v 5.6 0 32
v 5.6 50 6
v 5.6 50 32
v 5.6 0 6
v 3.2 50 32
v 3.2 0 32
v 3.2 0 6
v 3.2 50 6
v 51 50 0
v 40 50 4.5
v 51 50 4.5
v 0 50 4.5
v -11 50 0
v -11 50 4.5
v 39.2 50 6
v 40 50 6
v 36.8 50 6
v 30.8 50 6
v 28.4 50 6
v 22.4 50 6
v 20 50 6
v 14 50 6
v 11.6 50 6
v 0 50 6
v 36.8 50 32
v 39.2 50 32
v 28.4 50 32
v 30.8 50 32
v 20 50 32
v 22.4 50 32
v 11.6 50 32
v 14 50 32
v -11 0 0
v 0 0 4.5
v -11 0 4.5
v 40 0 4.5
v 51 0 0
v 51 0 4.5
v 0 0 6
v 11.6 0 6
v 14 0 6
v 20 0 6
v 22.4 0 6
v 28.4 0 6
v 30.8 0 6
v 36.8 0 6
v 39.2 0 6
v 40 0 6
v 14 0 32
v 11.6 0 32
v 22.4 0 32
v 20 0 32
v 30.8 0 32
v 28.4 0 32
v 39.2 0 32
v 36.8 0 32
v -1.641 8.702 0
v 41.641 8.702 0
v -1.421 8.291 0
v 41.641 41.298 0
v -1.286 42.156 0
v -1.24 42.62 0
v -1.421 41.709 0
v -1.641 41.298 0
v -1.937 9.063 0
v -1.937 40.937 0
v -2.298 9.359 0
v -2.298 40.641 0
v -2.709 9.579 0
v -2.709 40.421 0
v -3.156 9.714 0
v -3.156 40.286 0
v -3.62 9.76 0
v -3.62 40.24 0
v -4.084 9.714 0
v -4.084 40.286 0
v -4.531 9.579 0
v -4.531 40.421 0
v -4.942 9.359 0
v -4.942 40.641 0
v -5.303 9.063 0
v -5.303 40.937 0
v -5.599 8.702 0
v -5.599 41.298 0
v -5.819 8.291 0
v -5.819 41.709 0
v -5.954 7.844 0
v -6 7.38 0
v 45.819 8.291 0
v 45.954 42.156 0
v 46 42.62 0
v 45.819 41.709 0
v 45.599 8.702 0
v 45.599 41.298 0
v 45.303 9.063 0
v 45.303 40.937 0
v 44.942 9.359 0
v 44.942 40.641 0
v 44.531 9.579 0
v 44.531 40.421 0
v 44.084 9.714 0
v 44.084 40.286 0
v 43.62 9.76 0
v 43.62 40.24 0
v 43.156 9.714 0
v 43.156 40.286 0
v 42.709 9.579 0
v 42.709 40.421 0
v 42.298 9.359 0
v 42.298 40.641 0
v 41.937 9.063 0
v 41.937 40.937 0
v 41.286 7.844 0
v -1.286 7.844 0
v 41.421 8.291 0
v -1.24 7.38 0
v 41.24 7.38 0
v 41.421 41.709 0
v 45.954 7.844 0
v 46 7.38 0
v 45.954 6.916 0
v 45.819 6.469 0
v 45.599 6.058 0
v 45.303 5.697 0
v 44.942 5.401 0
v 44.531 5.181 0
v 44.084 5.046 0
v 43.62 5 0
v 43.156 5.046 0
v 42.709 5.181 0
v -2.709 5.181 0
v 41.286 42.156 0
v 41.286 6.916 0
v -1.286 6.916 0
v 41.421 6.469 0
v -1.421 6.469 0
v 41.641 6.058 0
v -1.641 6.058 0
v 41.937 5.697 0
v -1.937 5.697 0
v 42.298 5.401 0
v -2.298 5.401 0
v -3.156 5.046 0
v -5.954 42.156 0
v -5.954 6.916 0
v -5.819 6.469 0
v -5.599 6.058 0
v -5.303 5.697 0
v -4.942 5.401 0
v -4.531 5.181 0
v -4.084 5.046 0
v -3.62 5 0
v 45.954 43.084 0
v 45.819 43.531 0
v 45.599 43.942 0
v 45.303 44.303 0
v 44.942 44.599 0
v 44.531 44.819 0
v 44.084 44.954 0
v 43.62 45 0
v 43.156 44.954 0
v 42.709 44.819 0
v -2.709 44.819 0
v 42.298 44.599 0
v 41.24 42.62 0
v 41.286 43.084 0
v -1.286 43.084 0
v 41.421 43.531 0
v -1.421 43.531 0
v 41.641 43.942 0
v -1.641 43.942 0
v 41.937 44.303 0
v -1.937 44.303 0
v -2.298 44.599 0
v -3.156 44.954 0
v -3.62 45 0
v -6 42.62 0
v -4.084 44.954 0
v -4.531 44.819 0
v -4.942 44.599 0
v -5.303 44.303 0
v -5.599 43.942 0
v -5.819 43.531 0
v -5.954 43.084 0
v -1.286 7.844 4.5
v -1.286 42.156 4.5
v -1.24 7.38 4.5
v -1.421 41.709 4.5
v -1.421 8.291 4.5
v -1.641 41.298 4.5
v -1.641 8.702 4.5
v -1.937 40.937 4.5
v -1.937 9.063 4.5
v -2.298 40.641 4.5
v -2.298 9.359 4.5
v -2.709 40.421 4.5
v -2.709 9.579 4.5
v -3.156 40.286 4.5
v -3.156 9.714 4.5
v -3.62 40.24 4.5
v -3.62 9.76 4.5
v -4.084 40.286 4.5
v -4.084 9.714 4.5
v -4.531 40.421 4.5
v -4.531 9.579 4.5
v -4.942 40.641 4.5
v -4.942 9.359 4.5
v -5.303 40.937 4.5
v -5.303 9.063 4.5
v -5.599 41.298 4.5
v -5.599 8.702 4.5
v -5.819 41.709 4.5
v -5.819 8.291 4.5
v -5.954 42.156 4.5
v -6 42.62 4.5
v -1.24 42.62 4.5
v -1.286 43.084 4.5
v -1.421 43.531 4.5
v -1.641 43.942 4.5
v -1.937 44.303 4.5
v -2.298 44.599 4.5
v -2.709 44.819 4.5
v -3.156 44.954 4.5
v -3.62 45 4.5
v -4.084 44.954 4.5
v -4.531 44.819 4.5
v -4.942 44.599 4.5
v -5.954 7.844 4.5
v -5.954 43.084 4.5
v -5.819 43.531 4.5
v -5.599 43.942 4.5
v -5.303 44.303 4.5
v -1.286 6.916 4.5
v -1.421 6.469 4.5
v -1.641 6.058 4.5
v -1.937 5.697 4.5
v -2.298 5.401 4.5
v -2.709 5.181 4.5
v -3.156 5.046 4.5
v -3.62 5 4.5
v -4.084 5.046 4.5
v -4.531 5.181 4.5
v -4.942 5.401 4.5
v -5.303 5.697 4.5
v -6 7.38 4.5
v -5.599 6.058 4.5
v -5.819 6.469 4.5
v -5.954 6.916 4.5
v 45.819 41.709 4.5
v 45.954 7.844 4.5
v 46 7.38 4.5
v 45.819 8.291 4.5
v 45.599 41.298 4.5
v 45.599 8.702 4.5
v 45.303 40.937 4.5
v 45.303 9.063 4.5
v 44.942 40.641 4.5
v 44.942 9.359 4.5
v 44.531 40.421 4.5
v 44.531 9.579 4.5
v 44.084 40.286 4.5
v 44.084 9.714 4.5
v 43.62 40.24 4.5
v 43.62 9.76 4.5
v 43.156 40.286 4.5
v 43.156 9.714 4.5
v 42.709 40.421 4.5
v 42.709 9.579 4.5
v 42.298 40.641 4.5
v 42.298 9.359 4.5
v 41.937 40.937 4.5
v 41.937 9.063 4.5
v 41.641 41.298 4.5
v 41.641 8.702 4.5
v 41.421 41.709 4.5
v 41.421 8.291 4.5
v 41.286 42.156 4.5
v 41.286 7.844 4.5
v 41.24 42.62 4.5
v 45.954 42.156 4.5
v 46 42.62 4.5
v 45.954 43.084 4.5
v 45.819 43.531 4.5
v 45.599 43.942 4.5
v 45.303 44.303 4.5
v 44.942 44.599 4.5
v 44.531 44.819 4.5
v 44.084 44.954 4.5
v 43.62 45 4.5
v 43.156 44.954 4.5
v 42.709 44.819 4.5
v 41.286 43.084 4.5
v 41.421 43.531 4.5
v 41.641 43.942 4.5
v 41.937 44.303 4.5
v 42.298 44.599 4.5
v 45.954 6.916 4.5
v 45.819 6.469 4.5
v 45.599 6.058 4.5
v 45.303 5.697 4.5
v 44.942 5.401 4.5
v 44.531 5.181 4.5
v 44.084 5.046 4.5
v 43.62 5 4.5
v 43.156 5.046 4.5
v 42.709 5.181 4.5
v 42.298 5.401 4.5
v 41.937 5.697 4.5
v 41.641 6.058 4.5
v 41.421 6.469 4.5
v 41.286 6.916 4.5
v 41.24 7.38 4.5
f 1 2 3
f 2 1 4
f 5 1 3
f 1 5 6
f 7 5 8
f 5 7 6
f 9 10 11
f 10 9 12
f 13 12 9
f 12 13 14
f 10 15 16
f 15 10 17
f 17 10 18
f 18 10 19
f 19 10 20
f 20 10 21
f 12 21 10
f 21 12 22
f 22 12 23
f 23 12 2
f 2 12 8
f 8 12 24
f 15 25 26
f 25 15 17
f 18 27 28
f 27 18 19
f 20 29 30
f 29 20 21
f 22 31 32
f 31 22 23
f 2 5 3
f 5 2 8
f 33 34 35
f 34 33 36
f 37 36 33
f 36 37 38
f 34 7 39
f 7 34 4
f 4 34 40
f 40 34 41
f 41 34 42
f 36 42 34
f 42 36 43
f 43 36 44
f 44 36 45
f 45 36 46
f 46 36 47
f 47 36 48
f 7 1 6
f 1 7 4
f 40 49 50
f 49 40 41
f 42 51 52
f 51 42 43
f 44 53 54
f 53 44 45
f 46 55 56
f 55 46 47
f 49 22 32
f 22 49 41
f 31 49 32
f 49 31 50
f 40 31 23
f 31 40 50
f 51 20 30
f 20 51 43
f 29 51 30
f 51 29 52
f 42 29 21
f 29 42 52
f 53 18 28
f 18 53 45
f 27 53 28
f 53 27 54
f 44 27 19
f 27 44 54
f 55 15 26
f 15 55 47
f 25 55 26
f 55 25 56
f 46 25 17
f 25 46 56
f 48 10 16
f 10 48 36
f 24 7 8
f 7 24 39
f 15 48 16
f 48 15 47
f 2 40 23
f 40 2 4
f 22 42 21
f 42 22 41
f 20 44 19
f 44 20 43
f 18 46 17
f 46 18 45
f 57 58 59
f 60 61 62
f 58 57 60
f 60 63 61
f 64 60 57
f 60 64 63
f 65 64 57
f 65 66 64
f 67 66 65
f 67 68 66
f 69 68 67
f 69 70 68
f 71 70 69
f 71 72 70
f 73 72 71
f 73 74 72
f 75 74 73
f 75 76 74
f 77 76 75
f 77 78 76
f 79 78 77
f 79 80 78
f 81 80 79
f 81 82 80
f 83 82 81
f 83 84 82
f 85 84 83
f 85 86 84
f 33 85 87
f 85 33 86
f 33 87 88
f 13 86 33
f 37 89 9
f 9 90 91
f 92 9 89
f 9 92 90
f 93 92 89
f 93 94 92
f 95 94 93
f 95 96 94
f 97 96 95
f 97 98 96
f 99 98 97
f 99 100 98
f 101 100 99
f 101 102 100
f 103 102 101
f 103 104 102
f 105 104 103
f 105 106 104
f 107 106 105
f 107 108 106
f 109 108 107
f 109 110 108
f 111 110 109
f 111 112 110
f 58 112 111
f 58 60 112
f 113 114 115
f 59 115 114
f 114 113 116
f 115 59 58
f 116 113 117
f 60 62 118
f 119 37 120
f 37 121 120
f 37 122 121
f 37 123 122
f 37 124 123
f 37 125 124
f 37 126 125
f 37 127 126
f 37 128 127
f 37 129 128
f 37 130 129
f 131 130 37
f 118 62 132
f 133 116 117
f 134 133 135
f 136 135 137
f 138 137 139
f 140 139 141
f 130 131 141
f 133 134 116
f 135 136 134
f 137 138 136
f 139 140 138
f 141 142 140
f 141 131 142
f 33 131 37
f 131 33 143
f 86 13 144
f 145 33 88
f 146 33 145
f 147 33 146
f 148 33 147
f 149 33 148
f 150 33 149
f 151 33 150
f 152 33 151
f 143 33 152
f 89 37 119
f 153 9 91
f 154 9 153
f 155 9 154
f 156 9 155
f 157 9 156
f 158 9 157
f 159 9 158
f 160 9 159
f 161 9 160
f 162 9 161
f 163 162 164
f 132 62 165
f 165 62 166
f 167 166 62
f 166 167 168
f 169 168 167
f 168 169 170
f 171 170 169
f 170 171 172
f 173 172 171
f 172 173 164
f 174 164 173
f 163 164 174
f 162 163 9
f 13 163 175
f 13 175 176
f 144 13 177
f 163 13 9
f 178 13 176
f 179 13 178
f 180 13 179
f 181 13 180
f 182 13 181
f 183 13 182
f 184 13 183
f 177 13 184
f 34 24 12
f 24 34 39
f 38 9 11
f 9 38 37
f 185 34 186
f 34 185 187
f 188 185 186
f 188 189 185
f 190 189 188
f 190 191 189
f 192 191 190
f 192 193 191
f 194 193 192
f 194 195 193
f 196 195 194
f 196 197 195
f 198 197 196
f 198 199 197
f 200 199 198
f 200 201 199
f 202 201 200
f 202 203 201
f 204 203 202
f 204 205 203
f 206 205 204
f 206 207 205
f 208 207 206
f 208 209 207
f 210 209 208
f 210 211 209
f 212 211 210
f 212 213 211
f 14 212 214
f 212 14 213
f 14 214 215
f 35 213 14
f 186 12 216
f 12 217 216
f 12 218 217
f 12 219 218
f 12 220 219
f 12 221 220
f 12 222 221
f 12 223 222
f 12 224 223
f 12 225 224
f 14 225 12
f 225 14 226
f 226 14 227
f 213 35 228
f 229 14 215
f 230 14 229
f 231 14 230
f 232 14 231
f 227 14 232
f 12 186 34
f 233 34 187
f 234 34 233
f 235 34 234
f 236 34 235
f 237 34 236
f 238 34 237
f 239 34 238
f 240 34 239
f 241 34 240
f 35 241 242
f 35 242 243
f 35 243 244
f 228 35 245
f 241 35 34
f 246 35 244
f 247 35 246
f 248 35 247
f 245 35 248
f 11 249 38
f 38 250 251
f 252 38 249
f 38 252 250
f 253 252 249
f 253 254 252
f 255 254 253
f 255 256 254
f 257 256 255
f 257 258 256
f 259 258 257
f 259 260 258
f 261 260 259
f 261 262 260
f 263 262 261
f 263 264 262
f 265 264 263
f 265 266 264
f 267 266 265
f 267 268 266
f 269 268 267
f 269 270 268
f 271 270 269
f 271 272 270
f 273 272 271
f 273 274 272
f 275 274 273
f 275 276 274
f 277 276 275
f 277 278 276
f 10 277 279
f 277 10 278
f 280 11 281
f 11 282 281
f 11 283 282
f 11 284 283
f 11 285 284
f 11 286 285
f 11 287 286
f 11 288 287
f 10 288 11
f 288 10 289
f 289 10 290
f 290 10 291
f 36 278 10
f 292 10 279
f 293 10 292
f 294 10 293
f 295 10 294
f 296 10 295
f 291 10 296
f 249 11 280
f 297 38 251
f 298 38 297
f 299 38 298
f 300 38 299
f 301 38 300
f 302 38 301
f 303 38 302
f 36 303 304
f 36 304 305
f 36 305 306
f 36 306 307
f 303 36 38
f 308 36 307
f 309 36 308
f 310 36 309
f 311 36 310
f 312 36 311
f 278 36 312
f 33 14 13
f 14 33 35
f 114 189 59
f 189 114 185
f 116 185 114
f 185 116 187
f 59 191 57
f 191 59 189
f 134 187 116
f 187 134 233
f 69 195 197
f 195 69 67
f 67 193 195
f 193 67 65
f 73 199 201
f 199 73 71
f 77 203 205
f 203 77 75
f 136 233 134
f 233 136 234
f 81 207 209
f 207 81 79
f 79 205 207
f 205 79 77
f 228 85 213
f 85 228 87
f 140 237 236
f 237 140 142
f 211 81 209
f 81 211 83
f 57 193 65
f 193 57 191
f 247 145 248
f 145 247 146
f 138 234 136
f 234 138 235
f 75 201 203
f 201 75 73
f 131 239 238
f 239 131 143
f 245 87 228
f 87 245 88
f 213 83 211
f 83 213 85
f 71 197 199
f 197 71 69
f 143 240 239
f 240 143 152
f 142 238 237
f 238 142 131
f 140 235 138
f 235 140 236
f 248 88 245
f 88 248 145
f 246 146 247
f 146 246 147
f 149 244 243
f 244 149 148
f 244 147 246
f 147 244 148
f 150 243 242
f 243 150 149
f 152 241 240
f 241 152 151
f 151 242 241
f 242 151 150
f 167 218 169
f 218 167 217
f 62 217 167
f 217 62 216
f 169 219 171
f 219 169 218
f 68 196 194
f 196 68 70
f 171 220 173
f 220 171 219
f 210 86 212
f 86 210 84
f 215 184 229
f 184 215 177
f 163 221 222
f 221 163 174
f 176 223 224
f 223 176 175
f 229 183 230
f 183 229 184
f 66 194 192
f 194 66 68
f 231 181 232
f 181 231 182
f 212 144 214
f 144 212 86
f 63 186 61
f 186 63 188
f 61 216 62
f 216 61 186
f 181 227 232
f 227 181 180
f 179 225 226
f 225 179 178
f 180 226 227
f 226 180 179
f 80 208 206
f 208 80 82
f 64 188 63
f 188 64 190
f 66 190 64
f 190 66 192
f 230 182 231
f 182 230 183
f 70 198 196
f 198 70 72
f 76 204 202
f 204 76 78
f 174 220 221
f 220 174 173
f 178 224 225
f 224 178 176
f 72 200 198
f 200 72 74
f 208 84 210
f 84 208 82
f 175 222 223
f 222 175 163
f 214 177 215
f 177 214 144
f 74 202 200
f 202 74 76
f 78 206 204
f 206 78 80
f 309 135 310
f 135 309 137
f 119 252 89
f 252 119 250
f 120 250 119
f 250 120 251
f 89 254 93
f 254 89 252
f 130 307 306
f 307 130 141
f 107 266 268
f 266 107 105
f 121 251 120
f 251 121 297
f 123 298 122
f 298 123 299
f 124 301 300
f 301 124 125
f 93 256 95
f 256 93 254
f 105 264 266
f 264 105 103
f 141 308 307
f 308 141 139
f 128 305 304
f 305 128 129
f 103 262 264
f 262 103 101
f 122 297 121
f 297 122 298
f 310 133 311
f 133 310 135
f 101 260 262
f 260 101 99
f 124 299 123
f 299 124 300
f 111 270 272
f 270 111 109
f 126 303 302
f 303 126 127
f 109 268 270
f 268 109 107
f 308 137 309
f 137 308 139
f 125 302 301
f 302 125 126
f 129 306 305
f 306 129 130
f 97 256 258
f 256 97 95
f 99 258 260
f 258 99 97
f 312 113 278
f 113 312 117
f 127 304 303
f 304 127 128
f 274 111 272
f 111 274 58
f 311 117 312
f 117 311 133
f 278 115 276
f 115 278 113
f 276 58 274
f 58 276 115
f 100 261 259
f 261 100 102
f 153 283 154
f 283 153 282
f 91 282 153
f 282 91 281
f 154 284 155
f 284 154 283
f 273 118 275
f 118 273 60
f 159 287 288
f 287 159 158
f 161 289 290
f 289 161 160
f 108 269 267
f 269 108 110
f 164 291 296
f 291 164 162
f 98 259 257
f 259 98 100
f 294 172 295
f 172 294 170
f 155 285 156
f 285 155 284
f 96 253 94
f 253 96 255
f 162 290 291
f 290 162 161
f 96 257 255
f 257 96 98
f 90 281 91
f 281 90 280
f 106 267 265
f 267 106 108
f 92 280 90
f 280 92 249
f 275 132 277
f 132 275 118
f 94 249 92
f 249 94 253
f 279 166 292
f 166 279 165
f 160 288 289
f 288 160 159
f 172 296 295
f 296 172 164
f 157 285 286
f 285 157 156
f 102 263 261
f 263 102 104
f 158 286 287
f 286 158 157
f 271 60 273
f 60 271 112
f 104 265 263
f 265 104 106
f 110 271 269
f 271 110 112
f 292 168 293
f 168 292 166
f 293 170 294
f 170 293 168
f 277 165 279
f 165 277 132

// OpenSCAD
$fn = 32;

// ----------------------------------------------------------------------
// Finned heat sink: 40 x 50 mm base, 26 mm fins
// ----------------------------------------------------------------------

// --- parameters (mm) ---
base_w = 40;              // base width
base_d = 50;              // base depth
base_t = 6;               // base thickness
fin_h = 26;               // fin height above the base
holes_d = 4.76;           // fixing holes
hole_x = 23.62;           // hole offset in x
hole_y = 17.62;           // hole offset in y
fin_t = 2.4;              // fin thickness
fin_pitch = 8.4;          // fin pitch
fin_count = 5;            // number of fins
fin_x0 = 3.2;             // first fin offset
flange_w = 62;            // flange plate width
flange_t = 4;             // flange plate thickness

difference() {
  union() {
    cube([base_w, base_d, base_t]);
    for (i = [0 : fin_count - 1]) {
      translate([fin_x0 + i * fin_pitch, 0, base_t - 0.5]) cube([fin_t, base_d, fin_h + 0.5]);
    }
    /* mounting flange, a wider plate sharing the base bottom */
    translate([(base_w - flange_w) / 2, 0, 0]) cube([flange_w, base_d, flange_t + 0.5]);
  }
  /* fixing holes through the base, 2.5 mm clear on both sides */
  for (hx = [-23.62, 23.62]) {
    for (hy = [-17.62, 17.62]) {
      translate([base_w / 2 + hx, base_d / 2 + hy, -2.5]) cylinder(h = base_t + 5, d = holes_d);
    }
  }
}
